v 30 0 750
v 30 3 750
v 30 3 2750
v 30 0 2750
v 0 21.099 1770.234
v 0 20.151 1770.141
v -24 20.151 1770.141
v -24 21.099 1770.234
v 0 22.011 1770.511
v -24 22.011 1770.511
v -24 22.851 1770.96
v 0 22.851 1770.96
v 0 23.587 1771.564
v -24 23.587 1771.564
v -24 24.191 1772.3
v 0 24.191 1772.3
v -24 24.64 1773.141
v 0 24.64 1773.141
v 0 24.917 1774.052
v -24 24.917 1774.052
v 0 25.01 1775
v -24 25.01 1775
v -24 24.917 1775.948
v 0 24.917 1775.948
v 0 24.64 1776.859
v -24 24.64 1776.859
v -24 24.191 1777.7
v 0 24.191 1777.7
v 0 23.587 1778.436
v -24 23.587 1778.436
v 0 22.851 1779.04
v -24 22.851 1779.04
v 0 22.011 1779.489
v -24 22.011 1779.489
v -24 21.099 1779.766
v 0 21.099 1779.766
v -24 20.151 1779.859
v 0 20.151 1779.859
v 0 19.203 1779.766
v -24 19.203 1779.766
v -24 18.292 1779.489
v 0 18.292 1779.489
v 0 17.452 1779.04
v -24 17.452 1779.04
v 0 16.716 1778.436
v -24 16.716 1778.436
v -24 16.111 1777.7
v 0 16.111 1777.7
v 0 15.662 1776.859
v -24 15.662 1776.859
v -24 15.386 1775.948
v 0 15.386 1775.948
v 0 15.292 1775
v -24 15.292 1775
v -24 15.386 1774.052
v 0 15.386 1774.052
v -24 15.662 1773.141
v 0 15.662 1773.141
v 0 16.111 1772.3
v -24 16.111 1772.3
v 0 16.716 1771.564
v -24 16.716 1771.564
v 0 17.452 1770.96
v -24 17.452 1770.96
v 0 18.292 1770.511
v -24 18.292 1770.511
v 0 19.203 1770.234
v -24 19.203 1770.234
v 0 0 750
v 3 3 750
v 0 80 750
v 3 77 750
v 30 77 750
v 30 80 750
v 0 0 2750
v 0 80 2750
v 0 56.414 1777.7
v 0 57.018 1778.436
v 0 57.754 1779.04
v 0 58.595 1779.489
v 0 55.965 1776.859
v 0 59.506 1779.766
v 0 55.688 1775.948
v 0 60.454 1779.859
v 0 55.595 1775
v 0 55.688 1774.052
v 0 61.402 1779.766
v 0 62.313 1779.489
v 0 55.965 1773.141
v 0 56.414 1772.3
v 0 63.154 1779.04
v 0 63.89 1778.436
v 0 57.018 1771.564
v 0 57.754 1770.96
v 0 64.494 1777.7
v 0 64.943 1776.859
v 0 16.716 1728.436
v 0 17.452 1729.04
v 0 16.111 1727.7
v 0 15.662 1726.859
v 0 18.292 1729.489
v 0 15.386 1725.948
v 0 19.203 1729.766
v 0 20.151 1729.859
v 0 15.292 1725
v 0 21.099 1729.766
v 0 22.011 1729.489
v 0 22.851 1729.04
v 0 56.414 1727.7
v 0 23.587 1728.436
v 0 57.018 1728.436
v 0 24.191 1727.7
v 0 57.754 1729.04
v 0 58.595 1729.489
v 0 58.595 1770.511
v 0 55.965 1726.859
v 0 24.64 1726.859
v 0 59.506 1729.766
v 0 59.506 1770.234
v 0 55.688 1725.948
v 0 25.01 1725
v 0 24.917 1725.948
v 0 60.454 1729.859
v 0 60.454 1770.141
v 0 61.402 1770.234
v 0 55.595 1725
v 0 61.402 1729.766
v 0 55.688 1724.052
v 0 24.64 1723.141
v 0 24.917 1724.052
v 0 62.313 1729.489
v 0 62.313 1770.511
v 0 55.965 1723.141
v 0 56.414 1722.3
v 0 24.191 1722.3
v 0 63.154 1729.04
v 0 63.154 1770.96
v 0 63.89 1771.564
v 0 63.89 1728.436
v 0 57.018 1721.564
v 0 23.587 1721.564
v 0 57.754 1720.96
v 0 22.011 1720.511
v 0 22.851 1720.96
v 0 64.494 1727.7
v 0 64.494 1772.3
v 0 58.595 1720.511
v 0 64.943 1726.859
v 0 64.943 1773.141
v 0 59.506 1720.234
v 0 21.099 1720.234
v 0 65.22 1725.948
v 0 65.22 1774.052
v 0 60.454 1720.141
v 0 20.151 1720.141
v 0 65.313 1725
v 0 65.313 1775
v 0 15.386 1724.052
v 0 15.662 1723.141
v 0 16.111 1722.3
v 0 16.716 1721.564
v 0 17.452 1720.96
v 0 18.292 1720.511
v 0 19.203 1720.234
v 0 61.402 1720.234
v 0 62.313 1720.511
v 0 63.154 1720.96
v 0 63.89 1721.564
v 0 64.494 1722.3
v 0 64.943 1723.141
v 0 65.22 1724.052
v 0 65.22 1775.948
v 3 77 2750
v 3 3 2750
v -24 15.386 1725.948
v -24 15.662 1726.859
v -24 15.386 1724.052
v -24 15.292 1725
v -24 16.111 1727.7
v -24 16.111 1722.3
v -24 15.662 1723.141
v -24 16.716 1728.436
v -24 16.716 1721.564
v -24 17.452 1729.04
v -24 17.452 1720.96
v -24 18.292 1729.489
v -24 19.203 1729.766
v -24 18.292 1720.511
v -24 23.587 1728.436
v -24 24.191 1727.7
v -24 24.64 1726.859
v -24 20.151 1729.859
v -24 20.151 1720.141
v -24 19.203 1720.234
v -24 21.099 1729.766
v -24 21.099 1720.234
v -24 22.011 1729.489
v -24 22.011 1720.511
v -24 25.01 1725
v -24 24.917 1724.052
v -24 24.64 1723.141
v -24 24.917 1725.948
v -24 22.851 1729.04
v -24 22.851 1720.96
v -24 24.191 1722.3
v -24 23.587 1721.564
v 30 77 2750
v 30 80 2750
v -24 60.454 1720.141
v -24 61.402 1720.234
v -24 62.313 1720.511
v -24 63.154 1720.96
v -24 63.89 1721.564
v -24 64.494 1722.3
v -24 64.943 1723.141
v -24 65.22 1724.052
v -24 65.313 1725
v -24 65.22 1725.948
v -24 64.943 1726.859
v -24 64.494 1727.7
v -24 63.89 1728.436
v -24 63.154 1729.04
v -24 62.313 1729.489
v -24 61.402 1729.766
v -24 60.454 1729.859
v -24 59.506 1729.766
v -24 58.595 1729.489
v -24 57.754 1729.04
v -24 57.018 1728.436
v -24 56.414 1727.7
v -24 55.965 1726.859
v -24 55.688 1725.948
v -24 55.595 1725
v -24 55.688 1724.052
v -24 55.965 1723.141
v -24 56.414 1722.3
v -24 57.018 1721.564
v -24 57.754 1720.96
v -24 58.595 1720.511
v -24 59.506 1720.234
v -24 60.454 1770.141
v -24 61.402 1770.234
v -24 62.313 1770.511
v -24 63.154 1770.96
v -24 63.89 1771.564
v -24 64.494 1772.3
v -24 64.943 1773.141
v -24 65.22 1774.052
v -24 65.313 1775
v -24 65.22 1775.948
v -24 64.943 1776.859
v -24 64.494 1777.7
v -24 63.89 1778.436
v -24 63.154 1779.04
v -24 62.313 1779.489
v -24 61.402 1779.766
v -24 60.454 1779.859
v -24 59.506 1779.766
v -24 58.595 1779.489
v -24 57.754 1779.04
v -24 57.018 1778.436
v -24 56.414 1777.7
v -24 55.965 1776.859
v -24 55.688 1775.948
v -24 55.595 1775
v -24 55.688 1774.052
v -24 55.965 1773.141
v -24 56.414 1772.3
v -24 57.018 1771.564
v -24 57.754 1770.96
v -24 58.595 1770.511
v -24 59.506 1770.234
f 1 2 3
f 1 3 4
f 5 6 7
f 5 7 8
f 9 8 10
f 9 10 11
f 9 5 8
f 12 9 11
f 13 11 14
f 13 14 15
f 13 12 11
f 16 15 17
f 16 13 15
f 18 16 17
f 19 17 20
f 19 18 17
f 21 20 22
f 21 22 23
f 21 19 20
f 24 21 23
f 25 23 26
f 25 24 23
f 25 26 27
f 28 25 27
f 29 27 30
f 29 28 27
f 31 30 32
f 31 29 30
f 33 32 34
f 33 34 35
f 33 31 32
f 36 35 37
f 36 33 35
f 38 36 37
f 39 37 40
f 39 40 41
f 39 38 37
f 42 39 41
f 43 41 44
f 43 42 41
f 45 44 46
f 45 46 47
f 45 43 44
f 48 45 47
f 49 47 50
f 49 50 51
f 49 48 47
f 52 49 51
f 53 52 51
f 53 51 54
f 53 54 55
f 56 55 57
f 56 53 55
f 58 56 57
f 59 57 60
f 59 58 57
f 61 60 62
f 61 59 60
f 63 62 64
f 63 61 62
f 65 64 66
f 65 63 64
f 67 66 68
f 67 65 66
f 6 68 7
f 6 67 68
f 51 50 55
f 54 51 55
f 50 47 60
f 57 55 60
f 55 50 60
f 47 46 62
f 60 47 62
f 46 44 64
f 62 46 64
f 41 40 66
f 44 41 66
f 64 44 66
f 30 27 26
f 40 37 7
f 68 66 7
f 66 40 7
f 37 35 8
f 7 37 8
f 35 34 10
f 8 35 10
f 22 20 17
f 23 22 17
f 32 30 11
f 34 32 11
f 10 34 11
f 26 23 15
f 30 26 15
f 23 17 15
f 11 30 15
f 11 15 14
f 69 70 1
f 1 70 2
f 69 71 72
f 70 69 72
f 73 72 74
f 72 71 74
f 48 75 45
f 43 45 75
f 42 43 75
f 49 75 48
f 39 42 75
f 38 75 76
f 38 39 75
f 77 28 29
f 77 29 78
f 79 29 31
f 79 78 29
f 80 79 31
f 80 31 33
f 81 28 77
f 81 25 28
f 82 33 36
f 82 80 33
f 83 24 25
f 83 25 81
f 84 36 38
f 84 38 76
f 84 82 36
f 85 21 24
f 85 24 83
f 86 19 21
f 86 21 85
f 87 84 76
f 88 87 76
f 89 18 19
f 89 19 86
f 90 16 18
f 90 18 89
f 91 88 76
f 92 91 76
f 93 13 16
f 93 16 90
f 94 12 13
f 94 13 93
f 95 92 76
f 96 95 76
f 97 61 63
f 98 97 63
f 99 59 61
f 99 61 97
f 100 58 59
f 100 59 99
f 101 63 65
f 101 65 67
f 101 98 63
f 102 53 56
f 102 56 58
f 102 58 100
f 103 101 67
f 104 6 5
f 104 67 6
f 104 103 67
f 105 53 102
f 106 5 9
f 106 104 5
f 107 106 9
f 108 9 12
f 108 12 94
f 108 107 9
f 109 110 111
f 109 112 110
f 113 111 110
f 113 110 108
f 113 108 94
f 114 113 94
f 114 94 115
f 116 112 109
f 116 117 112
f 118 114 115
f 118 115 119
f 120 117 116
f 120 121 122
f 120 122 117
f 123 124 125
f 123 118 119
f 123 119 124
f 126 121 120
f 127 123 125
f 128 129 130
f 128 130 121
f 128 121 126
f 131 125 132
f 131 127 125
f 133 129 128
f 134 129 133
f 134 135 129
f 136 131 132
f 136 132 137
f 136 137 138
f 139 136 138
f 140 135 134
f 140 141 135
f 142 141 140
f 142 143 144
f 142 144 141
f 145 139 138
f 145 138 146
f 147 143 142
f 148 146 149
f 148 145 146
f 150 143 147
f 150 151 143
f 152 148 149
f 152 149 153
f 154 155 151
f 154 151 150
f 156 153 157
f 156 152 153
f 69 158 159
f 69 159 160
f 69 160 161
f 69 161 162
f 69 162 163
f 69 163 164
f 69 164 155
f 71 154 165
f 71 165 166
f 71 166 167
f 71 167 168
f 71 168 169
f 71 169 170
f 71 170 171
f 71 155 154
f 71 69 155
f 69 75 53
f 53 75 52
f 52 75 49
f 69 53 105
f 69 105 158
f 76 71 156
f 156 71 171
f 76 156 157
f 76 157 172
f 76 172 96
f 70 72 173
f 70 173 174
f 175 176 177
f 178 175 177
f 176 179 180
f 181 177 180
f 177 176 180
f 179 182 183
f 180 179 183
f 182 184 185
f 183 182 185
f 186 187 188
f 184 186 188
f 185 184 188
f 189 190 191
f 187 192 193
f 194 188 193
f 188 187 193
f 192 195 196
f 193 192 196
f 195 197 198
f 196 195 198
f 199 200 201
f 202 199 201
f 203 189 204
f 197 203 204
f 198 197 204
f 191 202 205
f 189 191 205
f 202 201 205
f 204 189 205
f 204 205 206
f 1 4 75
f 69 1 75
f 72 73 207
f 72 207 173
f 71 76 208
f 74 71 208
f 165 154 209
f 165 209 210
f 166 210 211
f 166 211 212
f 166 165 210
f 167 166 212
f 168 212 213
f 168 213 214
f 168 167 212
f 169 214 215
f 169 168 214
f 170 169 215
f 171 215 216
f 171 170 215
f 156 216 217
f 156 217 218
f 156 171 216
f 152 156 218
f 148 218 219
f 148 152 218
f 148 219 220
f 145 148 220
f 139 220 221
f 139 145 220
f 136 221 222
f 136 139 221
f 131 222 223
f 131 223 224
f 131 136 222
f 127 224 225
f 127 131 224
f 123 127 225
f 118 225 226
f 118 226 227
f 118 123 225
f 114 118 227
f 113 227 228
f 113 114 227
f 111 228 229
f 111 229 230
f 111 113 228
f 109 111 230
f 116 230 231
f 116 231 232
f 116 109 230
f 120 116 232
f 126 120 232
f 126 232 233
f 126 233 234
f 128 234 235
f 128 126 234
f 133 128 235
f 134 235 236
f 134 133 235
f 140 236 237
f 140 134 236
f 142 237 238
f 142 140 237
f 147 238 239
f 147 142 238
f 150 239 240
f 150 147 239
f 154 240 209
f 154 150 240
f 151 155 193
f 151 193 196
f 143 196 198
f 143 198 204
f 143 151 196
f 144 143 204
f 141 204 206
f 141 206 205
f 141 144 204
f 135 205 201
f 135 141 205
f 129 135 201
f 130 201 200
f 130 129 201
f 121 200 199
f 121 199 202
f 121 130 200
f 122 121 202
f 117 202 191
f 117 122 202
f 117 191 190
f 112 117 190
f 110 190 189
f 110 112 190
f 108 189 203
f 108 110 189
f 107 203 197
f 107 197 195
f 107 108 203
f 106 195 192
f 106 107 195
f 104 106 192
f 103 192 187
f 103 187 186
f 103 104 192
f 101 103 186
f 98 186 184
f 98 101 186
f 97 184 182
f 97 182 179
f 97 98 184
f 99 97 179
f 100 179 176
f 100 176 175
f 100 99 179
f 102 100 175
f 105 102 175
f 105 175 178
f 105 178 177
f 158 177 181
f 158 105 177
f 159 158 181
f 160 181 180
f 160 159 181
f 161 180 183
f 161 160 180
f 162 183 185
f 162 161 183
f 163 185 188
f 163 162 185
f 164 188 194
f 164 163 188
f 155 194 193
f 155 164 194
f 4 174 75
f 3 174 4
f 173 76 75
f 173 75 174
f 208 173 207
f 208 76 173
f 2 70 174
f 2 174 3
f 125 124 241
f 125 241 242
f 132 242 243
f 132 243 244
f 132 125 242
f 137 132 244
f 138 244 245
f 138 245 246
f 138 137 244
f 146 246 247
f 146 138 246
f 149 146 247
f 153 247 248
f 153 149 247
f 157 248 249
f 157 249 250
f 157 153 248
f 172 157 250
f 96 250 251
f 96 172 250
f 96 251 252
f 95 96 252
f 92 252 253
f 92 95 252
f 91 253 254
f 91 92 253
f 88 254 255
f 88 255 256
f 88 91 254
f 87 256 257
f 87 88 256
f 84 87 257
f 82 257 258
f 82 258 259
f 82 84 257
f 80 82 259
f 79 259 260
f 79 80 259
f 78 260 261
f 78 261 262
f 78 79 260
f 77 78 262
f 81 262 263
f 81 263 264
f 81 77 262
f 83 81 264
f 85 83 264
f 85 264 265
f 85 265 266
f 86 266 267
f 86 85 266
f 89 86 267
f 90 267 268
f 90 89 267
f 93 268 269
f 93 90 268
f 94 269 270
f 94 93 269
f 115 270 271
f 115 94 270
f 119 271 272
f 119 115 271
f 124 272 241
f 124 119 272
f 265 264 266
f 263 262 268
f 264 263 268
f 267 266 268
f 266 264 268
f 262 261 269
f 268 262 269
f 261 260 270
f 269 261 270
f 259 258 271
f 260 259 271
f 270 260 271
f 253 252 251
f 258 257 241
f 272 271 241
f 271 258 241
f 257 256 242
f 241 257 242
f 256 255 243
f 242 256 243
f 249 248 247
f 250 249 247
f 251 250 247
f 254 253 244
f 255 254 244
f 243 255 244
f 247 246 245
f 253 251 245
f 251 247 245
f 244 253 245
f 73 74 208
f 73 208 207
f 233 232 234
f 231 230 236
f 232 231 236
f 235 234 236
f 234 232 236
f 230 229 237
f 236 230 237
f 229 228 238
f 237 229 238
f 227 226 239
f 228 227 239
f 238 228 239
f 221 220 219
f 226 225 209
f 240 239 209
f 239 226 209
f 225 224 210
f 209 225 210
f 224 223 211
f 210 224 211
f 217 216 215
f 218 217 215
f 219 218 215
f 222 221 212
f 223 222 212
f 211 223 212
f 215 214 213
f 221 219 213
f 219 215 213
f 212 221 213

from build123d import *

# Parameters (mm, degrees)
SALIENTE_EXTRUIR1_DEPTH = 3500
CROQUIS2_R              = 4.85898955
SALIENTE_EXTRUIR2_DEPTH = 24
CROQUIS3_W              = 61.744916595
CROQUIS3_H              = 103.748261218
CORTAR_EXTRUIR1_DEPTH   = 750
CROQUIS4_W              = 41.753180027
CROQUIS4_H              = 90.106519095
CORTAR_EXTRUIR2_DEPTH   = 750


with BuildPart() as part:
    # Croquis1 → Saliente-Extruir1 (new body)
    with BuildSketch(Plane.XY):
        Polygon((0, 0), (0, 80), (30, 80), (30, 77), (3, 77), (3, 3), (30, 3), (30, 0), align=None)
    extrude(amount=SALIENTE_EXTRUIR1_DEPTH)

    # Croquis2 → Saliente-Extruir2 (add)
    with BuildSketch(Plane(origin=(0, 0, 0), x_dir=(0, 0, -1), z_dir=(1, 0, 0))):
        with Locations((-1725, 20.15133135)):
            Circle(CROQUIS2_R)
        with Locations((-1725, 60.453994049)):
            Circle(CROQUIS2_R)
        with Locations((-1775, 20.15133135)):
            Circle(CROQUIS2_R)
        with Locations((-1775, 60.453994049)):
            Circle(CROQUIS2_R)
    extrude(amount=-SALIENTE_EXTRUIR2_DEPTH)

    # Croquis3 → Cortar-Extruir1 (cut)
    with BuildSketch(Plane.XY):
        with Locations((6.570284293, 36.219698984)):
            Rectangle(CROQUIS3_W, CROQUIS3_H)
    extrude(amount=CORTAR_EXTRUIR1_DEPTH, mode=Mode.SUBTRACT)

    # Croquis4 → Cortar-Extruir2 (cut)
    with BuildSketch(Plane.XY.offset(3500)):
        with Locations((13.937202, 38.995627971)):
            Rectangle(CROQUIS4_W, CROQUIS4_H)
    extrude(amount=-CORTAR_EXTRUIR2_DEPTH, mode=Mode.SUBTRACT)


solid = part.part
